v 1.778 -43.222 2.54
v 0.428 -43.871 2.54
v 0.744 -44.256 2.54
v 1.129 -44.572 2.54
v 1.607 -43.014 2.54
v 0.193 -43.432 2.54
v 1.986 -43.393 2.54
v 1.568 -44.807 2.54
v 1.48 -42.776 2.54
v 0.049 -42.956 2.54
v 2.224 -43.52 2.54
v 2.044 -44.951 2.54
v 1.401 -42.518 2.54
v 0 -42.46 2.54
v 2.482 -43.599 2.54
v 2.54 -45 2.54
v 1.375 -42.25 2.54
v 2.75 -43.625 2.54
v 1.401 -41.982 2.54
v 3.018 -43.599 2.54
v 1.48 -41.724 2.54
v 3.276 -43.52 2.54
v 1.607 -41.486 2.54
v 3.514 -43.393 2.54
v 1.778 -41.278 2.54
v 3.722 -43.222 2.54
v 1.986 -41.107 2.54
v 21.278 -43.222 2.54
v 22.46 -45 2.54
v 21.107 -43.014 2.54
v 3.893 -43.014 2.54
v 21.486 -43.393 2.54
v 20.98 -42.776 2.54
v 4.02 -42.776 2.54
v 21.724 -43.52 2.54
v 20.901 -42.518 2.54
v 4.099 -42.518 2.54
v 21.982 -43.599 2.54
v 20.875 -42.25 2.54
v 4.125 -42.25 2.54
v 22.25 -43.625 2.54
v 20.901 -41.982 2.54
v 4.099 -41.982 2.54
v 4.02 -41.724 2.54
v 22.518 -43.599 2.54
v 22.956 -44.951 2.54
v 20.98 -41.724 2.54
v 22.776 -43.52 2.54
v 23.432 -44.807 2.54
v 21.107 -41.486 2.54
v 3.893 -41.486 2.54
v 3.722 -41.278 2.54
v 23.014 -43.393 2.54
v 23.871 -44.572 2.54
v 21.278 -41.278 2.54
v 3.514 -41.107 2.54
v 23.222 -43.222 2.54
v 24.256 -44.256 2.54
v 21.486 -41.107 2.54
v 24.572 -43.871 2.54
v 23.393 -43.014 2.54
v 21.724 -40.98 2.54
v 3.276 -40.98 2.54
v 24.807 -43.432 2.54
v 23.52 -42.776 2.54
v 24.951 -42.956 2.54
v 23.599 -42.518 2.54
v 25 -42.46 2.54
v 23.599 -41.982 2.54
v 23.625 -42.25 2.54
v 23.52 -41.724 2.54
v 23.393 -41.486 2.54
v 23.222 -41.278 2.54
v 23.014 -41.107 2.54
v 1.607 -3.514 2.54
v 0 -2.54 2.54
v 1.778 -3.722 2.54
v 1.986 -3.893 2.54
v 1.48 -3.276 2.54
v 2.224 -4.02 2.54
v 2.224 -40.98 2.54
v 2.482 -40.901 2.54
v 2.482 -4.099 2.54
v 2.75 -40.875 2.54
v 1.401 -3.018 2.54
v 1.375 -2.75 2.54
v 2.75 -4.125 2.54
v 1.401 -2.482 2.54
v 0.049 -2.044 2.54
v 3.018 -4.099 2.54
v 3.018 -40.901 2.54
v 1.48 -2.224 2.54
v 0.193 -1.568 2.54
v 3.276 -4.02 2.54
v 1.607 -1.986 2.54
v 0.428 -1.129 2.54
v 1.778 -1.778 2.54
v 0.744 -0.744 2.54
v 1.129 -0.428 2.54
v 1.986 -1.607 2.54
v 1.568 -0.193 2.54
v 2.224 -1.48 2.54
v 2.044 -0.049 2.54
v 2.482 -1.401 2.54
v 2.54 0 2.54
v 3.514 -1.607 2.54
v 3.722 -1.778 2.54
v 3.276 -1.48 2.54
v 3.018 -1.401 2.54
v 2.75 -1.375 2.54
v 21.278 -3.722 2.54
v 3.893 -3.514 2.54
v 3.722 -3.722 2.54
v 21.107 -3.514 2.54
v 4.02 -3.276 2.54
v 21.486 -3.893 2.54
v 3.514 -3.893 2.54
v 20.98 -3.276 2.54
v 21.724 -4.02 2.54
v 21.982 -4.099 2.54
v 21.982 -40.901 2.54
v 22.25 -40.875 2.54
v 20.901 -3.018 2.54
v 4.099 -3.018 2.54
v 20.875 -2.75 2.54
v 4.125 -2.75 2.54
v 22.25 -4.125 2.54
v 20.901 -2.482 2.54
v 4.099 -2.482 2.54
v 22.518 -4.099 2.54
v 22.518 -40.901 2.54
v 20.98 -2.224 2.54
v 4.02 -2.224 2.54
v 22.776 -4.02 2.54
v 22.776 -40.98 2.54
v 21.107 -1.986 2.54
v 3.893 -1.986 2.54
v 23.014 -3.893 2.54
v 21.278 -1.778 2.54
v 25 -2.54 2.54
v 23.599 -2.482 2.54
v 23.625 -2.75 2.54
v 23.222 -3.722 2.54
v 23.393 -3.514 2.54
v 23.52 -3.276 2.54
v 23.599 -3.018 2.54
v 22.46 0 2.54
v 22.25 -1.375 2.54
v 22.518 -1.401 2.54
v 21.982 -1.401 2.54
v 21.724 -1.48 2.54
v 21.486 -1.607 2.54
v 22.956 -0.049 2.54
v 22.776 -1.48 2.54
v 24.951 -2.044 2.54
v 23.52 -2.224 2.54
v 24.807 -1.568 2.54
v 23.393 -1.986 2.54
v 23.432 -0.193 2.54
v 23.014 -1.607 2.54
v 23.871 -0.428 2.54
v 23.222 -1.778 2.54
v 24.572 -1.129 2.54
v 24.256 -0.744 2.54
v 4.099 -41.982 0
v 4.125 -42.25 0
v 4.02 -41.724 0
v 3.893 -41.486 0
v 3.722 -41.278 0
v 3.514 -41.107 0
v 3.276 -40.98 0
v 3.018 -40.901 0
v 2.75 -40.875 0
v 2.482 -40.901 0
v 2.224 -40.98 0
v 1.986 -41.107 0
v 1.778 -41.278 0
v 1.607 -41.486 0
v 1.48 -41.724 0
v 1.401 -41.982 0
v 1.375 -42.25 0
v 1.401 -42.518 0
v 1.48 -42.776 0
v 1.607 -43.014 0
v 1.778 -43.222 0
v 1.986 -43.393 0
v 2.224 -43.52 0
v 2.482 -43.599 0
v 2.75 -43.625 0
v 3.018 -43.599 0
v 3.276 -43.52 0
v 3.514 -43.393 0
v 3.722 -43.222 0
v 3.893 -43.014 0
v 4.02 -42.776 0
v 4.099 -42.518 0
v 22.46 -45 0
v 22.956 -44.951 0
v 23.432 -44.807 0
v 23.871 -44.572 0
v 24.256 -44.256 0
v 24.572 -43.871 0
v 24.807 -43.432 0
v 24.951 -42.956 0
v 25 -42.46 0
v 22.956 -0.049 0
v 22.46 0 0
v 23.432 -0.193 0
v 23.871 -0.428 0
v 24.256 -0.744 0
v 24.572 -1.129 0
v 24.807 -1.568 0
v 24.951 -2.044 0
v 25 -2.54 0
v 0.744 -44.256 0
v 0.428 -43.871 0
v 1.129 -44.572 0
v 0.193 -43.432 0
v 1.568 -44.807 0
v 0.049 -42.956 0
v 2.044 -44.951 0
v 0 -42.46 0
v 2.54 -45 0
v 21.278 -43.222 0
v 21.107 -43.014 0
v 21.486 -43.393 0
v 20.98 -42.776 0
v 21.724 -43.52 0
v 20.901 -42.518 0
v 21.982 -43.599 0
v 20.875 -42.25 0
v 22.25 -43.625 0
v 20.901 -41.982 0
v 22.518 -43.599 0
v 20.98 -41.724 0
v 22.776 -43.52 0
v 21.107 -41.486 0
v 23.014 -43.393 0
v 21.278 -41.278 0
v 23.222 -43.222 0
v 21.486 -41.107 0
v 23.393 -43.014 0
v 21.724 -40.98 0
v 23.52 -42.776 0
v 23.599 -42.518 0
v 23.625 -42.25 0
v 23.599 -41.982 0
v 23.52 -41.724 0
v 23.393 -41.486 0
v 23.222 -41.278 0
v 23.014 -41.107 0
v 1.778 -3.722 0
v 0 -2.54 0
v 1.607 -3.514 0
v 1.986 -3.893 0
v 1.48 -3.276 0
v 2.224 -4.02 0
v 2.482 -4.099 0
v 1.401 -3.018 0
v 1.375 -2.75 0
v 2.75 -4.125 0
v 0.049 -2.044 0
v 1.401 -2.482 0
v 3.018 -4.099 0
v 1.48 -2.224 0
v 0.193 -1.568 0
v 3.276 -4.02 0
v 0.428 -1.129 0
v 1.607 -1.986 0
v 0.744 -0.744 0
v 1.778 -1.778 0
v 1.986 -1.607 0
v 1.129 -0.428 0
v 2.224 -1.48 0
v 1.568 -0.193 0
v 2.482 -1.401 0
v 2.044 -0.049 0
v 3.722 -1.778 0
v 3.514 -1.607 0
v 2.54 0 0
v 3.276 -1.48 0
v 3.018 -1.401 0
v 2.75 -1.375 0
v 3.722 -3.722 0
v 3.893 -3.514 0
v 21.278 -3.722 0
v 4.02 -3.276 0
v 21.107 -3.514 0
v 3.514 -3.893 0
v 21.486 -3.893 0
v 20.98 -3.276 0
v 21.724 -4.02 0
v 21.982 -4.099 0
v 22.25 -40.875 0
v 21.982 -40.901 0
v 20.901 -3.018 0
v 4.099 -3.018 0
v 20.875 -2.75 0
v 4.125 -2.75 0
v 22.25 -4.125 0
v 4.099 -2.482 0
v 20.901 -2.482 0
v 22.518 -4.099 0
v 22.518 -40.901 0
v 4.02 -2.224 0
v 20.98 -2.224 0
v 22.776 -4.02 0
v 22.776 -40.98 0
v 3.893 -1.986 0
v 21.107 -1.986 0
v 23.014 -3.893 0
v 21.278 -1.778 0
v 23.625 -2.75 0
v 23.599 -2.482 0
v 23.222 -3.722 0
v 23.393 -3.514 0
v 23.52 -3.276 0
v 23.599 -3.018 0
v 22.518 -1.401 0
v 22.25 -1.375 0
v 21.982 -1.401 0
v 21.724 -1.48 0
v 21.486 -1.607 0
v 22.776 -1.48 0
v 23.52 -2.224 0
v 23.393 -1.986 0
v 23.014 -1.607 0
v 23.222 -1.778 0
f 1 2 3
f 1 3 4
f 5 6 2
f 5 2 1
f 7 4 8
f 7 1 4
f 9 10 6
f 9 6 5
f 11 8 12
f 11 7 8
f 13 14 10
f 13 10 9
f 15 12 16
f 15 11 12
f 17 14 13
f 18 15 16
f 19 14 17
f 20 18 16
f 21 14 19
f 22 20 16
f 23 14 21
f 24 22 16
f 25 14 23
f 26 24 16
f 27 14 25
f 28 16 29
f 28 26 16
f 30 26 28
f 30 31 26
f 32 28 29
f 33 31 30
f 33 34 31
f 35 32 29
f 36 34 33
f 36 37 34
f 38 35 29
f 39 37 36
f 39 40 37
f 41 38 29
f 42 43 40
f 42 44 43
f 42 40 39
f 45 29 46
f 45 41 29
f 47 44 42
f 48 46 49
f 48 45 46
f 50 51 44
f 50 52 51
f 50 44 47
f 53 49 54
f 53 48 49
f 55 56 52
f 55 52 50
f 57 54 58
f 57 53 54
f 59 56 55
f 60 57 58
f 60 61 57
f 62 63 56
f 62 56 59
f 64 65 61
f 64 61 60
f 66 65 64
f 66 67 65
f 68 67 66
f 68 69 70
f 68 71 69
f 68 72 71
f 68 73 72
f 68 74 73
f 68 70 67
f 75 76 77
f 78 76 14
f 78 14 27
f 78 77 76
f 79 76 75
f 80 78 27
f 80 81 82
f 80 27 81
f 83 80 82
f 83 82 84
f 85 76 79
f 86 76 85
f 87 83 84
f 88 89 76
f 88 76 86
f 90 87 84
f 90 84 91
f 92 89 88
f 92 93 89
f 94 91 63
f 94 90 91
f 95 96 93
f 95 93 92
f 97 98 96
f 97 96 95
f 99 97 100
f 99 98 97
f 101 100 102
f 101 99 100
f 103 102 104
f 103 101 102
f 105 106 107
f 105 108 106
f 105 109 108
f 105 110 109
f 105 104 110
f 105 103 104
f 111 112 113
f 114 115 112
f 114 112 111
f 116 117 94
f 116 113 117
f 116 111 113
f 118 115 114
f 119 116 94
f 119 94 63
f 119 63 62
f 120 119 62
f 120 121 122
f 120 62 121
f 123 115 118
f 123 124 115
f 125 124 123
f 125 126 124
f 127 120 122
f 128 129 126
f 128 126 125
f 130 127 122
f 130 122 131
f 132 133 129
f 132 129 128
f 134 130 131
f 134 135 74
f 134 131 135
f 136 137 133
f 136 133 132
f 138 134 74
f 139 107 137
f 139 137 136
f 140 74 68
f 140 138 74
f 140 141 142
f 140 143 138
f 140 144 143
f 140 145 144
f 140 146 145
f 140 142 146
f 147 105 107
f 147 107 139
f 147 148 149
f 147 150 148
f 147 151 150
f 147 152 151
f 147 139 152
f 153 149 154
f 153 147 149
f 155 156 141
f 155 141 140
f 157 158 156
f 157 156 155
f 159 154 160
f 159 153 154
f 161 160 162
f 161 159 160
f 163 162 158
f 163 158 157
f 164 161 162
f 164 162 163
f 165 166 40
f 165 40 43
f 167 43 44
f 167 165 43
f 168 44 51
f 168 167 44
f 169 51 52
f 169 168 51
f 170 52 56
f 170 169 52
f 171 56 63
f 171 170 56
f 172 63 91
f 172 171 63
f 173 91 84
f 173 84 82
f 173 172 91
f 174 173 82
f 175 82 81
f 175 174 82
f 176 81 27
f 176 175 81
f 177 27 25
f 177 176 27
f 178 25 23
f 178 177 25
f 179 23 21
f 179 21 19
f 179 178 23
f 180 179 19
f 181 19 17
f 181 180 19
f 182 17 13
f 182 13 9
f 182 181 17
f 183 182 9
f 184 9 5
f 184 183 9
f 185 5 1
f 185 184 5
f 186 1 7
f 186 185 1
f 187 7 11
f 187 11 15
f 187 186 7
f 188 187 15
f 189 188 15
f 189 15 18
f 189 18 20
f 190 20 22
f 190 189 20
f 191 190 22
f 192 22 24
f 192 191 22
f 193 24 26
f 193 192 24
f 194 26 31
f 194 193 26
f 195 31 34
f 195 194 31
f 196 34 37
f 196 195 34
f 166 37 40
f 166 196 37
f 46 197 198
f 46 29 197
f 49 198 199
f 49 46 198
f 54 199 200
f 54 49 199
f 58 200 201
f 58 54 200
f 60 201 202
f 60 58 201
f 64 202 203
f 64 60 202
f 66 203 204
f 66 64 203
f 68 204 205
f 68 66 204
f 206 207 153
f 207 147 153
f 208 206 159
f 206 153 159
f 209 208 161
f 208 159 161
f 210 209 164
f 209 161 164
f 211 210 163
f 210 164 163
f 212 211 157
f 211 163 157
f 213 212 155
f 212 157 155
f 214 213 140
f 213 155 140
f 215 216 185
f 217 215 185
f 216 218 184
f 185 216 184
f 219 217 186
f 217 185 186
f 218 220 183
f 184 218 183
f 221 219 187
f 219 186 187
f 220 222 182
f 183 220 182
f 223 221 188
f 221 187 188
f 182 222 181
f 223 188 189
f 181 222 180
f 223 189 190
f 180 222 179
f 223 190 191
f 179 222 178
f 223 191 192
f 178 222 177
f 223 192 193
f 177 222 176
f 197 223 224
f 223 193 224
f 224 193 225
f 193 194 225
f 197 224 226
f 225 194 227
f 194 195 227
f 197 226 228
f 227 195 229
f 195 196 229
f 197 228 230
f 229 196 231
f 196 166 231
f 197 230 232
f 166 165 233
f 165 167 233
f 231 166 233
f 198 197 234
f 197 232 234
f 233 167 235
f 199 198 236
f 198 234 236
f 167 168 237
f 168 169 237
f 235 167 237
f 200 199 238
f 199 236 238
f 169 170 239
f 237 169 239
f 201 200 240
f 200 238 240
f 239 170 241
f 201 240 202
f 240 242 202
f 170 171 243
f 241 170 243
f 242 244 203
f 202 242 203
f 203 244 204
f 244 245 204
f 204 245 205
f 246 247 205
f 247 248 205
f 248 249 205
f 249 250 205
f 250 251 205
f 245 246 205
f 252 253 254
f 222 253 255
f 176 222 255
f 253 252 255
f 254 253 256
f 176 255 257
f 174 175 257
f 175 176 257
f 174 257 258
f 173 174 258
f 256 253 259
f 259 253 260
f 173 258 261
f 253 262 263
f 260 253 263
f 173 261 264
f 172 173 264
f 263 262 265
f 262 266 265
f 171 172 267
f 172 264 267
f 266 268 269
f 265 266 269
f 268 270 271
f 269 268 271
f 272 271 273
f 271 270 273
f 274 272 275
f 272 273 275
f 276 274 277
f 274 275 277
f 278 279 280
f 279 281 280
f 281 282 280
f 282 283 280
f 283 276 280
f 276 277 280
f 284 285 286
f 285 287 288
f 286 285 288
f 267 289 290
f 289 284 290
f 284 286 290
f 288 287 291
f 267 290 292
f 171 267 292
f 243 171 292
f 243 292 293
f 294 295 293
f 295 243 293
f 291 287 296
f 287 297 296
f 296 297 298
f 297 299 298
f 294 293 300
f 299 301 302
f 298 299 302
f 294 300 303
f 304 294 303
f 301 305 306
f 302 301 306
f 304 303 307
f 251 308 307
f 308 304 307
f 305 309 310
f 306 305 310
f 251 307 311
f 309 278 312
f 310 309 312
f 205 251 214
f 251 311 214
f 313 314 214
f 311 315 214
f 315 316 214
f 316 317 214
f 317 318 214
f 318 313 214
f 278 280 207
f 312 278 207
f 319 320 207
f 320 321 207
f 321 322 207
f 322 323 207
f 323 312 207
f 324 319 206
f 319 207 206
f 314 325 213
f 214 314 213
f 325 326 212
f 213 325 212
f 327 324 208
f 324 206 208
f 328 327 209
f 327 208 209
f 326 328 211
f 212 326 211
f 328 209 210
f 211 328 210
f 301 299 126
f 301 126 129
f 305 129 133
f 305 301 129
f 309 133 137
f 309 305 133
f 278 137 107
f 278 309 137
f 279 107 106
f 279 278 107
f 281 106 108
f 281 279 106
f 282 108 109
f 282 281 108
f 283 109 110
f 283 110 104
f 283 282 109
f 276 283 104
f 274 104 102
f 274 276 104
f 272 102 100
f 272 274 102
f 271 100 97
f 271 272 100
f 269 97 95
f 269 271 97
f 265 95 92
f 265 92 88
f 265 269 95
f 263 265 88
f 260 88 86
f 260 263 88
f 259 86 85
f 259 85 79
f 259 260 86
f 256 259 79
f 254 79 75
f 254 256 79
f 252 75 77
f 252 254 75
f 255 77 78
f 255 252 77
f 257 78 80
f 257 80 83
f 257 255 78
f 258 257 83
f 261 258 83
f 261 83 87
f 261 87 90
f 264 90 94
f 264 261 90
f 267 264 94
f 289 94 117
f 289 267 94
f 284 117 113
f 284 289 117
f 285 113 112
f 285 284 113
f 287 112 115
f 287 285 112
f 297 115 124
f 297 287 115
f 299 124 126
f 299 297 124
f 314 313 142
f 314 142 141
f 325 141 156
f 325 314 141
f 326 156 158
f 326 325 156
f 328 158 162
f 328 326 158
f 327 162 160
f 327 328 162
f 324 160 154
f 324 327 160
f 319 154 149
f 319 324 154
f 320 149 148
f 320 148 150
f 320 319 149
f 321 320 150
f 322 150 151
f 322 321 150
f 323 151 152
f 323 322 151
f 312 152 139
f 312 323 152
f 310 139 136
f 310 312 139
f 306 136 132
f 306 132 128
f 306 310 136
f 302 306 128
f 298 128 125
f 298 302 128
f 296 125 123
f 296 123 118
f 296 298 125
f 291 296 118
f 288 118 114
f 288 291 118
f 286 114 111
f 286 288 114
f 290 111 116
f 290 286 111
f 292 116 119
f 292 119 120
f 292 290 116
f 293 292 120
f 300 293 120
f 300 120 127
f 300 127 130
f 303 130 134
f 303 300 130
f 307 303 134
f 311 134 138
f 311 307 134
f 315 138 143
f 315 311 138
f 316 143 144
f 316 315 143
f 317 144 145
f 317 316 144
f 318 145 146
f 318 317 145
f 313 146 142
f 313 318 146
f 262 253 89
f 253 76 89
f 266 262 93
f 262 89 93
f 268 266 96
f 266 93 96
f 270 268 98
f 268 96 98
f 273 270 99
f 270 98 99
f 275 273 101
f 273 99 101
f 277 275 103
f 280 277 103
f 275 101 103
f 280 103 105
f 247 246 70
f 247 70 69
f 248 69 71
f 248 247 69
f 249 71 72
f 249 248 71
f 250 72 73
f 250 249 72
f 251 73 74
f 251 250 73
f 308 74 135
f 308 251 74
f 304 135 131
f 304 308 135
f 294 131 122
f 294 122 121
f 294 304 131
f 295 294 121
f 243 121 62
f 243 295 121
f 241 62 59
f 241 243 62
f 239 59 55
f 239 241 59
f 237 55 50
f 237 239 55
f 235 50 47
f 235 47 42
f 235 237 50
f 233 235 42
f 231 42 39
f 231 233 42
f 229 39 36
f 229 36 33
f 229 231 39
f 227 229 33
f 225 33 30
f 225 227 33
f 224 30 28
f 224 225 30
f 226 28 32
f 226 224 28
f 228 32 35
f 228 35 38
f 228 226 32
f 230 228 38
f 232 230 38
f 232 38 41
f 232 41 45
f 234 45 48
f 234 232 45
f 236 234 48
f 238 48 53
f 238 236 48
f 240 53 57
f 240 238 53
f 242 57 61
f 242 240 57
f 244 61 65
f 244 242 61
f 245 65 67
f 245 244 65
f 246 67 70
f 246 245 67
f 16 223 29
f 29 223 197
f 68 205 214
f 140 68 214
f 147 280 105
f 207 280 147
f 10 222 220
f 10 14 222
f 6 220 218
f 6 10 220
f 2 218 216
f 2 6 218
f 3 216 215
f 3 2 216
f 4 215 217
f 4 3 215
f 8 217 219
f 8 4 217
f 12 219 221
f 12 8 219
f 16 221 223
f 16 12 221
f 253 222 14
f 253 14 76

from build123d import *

# Parameters (mm, degrees)
SKETCH1_W           = 25
SKETCH1_H           = 45
SKETCH1_R           = 1.375
BOSS_EXTRUDE1_DEPTH = 2.54
FILLET1_R           = 2.54


with BuildPart() as part:
    # Sketch1 → Boss-Extrude1 (new body)
    with BuildSketch(Plane.XY):
        with Locations((12.5, -22.5)):
            Rectangle(SKETCH1_W, SKETCH1_H)
        with Locations((2.75, -2.75)):
            Circle(SKETCH1_R, mode=Mode.SUBTRACT)
        with Locations((2.75, -42.25)):
            Circle(SKETCH1_R, mode=Mode.SUBTRACT)
        with Locations((22.25, -42.25)):
            Circle(SKETCH1_R, mode=Mode.SUBTRACT)
        with Locations((22.25, -2.75)):
            Circle(SKETCH1_R, mode=Mode.SUBTRACT)
    extrude(amount=BOSS_EXTRUDE1_DEPTH)

    # Fillet1
    fillet1_edges = [part.edges().sort_by_distance(p)[0] for p in [
        (0, 0, 1.27),
        (25, 0, 1.27),
        (25, -45, 1.27),
        (0, -45, 1.27),
    ]]
    fillet(fillet1_edges, radius=FILLET1_R)


solid = part.part
